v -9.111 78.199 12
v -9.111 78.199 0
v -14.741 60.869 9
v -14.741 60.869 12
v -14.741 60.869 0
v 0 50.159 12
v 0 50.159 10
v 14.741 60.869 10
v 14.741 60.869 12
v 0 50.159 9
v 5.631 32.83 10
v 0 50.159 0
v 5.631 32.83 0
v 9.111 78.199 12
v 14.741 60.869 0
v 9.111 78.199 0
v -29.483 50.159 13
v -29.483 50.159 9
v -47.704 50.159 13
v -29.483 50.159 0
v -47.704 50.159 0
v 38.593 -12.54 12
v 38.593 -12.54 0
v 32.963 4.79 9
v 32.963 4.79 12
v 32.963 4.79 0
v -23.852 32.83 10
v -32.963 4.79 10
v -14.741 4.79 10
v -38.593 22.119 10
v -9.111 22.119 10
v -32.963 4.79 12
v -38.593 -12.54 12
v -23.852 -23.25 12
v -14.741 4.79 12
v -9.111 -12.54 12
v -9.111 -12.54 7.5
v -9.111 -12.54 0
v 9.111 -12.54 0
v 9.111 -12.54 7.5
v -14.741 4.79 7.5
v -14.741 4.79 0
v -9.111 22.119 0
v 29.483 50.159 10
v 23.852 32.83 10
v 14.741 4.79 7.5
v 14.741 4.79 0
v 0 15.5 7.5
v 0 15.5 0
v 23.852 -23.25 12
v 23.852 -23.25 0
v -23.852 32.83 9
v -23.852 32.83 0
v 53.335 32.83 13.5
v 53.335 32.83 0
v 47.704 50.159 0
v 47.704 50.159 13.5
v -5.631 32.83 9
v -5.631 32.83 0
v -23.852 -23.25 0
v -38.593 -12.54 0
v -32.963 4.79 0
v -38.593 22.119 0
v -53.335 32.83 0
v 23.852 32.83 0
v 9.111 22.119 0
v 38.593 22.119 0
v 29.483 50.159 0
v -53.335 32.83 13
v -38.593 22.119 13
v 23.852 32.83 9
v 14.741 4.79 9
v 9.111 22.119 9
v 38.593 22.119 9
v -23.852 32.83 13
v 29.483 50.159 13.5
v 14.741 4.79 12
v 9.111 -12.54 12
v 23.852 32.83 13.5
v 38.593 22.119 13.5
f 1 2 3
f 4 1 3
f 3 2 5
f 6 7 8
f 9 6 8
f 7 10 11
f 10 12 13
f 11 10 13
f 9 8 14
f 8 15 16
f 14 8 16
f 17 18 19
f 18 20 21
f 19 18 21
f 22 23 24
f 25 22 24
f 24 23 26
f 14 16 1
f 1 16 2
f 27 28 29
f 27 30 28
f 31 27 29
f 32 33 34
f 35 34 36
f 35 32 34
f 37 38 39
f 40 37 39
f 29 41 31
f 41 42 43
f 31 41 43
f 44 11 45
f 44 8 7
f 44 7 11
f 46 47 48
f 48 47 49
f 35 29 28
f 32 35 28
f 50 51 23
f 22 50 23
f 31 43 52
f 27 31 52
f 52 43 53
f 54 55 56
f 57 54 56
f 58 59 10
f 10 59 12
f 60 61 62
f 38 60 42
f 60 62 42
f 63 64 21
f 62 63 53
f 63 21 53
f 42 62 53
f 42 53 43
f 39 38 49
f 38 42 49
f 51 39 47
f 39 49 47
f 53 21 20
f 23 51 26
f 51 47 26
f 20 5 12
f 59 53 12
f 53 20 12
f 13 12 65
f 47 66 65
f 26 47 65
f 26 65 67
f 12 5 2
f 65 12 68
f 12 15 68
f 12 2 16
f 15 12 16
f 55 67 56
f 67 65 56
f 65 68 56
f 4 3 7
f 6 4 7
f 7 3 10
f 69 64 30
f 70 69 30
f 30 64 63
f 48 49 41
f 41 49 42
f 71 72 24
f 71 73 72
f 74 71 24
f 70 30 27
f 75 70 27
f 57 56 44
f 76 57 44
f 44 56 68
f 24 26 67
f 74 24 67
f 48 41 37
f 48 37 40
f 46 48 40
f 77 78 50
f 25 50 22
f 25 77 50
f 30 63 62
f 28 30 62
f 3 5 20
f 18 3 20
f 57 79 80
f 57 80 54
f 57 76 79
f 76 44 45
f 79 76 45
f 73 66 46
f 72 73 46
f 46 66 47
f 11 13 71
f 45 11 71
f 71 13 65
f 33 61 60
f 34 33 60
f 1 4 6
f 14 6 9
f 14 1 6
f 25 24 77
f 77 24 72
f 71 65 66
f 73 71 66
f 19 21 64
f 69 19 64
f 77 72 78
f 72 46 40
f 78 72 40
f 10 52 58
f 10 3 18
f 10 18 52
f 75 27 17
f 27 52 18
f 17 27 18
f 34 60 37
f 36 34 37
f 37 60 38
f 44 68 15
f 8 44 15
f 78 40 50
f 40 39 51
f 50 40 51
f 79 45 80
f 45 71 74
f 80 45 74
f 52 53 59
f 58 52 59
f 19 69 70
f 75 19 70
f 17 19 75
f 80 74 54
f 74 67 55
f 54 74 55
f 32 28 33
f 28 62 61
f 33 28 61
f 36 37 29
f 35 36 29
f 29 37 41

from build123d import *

# Parameters (mm, degrees)
F1_DEPTH  = 7.5
F3_DEPTH  = 12
F5_DEPTH  = 9
F7_DEPTH  = 13.5
F9_DEPTH  = 10
F11_DEPTH = 12
F13_DEPTH = 9
F15_DEPTH = 13
F17_DEPTH = 10
F19_DEPTH = 12


with BuildPart() as f1:
    # F0 (on Top) → F1 (new body)
    with BuildSketch(Plane.XY):
        Polygon((14.7413760026, 4.7897634128), (0, 15.5), (-14.7413760026, 4.7897634128), (-9.1106714105, -12.5397634128), (9.1106714105, -12.5397634128), align=None)
    extrude(amount=F1_DEPTH)

    # F2 (on Top) → F3 (join)
    with BuildSketch(Plane.XY):
        Polygon((32.9627188236, 4.7897634128), (14.7413760026, 4.7897634128), (9.1106714105, -12.5397634128), (23.8520474131, -23.25), (38.5934234157, -12.5397634128), align=None)
    extrude(amount=F3_DEPTH)

    # F4 (on Top) → F5 (join)
    with BuildSketch(Plane.XY):
        Polygon((14.7413760026, 4.7897634128), (32.9627188236, 4.7897634128), (38.5934234157, 22.1192902384), (23.8520474131, 32.8295268256), (9.1106714105, 22.1192902384), align=None)
    extrude(amount=F5_DEPTH)

    # F6 (on Top) → F7 (join)
    with BuildSketch(Plane.XY):
        Polygon((23.8520474131, 32.8295268256), (38.5934234157, 22.1192902384), (53.3347994183, 32.8295268256), (47.7040948262, 50.1590536512), (29.4827520051, 50.1590536512), align=None)
    extrude(amount=F7_DEPTH)

    # F8 (on Top) → F9 (join)
    with BuildSketch(Plane.XY):
        Polygon((5.630704592, 32.8295268256), (23.8520474131, 32.8295268256), (29.4827520051, 50.1590536512), (14.7413760026, 60.8692902384), (0, 50.1590536512), align=None)
    extrude(amount=F9_DEPTH)

    # F10 (on Top) → F11 (join)
    with BuildSketch(Plane.XY):
        Polygon((-14.7413760026, 60.8692902384), (0, 50.1590536512), (14.7413760026, 60.8692902384), (9.1106714105, 78.1988170641), (-9.1106714105, 78.1988170641), align=None)
    extrude(amount=F11_DEPTH)

    # F12 (on Top) → F13 (join)
    with BuildSketch(Plane.XY):
        Polygon((-23.8520474131, 32.8295268256), (-5.630704592, 32.8295268256), (0, 50.1590536512), (-14.7413760026, 60.8692902384), (-29.4827520051, 50.1590536512), align=None)
    extrude(amount=F13_DEPTH)

    # F14 (on Top) → F15 (join)
    with BuildSketch(Plane.XY):
        Polygon((-53.3347994183, 32.8295268256), (-38.5934234157, 22.1192902384), (-23.8520474131, 32.8295268256), (-29.4827520051, 50.1590536512), (-47.7040948262, 50.1590536512), align=None)
    extrude(amount=F15_DEPTH)

    # F16 (on Top) → F17 (join)
    with BuildSketch(Plane.XY):
        Polygon((-32.9627188236, 4.7897634128), (-14.7413760026, 4.7897634128), (-9.1106714105, 22.1192902384), (-23.8520474131, 32.8295268256), (-38.5934234157, 22.1192902384), align=None)
    extrude(amount=F17_DEPTH)

    # F18 (on Top) → F19 (join)
    with BuildSketch(Plane.XY):
        Polygon((-23.8520474131, -23.25), (-9.1106714105, -12.5397634128), (-14.7413760026, 4.7897634128), (-32.9627188236, 4.7897634128), (-38.5934234157, -12.5397634128), align=None)
    extrude(amount=F19_DEPTH)


solid = f1.part
